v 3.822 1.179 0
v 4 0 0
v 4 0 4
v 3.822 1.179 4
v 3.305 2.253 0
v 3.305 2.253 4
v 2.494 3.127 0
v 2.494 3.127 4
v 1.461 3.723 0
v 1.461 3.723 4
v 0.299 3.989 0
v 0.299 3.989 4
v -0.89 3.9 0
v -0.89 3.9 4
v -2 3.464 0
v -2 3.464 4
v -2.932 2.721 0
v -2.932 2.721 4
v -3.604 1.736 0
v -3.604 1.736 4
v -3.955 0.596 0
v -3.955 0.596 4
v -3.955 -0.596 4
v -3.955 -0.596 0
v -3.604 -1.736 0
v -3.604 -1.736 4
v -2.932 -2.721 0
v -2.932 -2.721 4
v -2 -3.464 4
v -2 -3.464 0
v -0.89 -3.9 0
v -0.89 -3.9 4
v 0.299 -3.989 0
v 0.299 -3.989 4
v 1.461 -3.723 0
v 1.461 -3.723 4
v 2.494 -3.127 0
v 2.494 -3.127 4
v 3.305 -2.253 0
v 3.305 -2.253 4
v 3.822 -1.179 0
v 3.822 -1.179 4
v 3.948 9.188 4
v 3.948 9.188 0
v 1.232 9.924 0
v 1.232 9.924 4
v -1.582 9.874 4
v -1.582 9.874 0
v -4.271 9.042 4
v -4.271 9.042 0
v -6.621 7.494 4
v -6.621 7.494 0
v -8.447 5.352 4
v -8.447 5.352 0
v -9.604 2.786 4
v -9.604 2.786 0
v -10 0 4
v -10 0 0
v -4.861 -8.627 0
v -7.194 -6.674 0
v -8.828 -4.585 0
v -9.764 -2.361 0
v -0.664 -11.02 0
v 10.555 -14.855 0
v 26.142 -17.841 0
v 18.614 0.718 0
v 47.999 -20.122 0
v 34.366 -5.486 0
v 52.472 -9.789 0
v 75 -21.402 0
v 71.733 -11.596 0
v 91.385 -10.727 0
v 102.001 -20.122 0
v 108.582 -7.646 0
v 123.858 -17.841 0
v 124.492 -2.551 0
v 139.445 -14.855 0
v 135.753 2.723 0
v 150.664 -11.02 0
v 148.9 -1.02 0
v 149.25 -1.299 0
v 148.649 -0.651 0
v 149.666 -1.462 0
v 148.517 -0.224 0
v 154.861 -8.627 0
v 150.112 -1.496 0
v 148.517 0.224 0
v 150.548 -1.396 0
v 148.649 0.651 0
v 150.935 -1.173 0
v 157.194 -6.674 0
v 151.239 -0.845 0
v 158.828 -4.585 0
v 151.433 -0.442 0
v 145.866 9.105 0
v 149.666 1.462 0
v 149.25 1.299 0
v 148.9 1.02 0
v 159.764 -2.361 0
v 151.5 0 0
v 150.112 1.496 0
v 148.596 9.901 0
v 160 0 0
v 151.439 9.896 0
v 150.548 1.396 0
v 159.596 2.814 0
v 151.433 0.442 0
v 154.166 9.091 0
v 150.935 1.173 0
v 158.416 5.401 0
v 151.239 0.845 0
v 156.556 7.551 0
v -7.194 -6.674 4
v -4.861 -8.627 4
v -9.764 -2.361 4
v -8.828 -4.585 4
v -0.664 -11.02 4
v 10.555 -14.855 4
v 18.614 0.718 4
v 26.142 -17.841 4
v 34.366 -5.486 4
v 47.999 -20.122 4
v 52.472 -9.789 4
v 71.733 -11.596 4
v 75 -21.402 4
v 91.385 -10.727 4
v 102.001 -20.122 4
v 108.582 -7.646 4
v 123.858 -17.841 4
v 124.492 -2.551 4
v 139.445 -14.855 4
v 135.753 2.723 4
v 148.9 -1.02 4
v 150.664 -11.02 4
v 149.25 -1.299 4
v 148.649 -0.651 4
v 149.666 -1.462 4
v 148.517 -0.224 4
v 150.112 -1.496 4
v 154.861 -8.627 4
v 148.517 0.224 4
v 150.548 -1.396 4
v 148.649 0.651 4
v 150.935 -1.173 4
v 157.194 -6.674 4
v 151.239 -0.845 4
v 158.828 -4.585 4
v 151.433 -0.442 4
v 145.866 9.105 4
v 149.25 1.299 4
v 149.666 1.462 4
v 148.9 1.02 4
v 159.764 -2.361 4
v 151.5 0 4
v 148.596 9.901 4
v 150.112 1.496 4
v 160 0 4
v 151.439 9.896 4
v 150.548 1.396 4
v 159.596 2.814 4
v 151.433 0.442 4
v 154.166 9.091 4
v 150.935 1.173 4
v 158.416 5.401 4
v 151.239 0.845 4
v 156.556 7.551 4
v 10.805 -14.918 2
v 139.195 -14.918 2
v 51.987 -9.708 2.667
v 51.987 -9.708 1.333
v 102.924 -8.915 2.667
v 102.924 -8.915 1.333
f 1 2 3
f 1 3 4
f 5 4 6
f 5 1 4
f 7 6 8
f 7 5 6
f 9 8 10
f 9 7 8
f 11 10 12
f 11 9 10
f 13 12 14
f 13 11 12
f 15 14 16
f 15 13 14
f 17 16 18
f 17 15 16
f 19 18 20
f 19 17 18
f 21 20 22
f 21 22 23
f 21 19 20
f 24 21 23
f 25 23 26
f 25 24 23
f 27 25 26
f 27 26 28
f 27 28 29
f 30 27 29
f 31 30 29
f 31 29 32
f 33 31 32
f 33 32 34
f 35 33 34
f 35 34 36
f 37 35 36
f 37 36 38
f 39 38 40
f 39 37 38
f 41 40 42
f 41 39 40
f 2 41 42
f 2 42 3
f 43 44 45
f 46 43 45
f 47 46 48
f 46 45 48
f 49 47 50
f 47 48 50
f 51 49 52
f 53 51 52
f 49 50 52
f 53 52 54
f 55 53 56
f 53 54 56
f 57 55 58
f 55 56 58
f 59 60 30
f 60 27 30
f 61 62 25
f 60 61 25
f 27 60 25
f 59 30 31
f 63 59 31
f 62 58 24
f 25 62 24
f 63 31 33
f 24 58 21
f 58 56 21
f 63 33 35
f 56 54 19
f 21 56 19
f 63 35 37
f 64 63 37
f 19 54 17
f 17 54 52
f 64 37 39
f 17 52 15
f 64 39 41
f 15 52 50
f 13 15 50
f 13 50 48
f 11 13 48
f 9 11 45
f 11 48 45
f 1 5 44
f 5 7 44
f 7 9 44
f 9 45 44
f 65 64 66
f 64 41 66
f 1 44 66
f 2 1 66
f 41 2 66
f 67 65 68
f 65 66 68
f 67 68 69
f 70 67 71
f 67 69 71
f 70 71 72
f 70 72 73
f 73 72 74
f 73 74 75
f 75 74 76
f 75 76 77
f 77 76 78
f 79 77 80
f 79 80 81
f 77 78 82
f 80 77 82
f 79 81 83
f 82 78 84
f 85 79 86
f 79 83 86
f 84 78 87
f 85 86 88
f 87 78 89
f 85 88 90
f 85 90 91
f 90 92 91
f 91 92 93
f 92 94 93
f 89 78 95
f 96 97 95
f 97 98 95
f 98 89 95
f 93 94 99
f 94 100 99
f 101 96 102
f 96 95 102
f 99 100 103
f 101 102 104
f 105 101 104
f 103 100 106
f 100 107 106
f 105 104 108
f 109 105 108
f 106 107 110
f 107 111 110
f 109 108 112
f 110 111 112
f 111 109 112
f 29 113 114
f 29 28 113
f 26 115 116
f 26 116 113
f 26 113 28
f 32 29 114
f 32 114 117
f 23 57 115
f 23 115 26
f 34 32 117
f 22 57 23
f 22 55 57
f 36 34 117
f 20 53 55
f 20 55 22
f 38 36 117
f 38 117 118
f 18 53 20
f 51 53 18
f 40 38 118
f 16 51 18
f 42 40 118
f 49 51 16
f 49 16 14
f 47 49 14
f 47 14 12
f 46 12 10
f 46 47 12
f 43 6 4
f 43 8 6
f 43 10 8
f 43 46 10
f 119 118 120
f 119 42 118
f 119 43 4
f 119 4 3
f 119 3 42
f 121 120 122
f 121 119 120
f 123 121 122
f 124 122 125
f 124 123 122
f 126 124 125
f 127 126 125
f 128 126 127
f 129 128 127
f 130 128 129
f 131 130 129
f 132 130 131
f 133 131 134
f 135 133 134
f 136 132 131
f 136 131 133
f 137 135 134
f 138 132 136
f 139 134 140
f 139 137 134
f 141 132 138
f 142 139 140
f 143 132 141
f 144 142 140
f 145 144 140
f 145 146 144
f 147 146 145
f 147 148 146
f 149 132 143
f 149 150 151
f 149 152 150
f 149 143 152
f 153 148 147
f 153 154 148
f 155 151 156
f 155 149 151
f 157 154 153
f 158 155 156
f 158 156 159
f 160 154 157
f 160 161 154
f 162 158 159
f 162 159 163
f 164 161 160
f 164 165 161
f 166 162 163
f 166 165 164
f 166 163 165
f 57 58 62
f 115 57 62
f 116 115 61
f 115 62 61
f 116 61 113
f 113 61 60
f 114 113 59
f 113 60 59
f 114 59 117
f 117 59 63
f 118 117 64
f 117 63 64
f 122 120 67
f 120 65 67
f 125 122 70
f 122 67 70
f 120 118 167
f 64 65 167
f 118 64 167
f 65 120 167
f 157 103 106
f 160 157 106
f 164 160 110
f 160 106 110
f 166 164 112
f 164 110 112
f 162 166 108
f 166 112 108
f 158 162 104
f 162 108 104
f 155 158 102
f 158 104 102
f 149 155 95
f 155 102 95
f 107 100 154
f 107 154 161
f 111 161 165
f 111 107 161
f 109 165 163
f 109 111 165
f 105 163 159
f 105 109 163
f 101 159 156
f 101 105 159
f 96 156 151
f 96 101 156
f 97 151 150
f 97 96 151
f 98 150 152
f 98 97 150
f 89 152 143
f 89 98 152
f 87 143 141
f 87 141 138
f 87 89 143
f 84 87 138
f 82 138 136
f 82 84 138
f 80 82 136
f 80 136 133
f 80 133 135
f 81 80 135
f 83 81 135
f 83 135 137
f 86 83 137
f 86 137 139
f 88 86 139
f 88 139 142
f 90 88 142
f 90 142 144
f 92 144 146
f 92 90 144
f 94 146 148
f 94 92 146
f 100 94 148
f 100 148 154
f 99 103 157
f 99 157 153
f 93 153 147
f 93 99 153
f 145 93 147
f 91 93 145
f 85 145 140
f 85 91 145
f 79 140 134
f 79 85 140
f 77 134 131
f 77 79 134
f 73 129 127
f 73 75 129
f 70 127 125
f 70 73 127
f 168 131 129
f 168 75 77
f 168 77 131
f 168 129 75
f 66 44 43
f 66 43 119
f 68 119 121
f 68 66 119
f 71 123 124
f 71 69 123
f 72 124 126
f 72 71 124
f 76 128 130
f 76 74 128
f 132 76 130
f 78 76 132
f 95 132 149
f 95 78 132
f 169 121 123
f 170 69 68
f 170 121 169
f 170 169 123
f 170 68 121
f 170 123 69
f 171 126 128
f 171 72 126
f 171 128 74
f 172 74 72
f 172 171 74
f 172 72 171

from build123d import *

# Parameters (mm, degrees)
SKETCH_1_R      = 4
SKETCH_1_R_2    = 1.5
EXTRUDE_1_DEPTH = 4


with BuildPart() as part:
    # 草图1 → 凸台-拉伸1 (new body)
    with BuildSketch(Plane.XY):
        with BuildLine():
            ThreePointArc((3.948047826, 9.187650318), (-5.50088728, 8.351062156), (-10, 0))
            add(Edge.make_bspline(
                [(-10, 0), (-10.890214237, -19.135341361), (75, -21.401956932)],
                knots=[0, 0, 0, 1, 1, 1], degree=2))
            add(Edge.make_bspline(
                [(160, 0), (160.890214237, -19.135341361), (75, -21.401956932)],
                knots=[0, 0, 0, 1, 1, 1], degree=2))
            ThreePointArc((160, 0), (155.415713455, 8.40654791), (145.865990446, 9.105490926))
            add(Edge.make_bspline(
                [(3.948047826, 9.187650318), (46.906488456, -20.373746255), (110.551742639, -16.70704022), (145.865990446, 9.105490926)],
                knots=[0.022448948, 0.022448948, 0.022448948, 0.022448948, 0.850781246, 0.850781246, 0.850781246, 0.850781246], degree=3))
        make_face()
        Circle(SKETCH_1_R, mode=Mode.SUBTRACT)
        with Locations((150, 0)):
            Circle(SKETCH_1_R_2, mode=Mode.SUBTRACT)
    extrude(amount=EXTRUDE_1_DEPTH)


solid = part.part
